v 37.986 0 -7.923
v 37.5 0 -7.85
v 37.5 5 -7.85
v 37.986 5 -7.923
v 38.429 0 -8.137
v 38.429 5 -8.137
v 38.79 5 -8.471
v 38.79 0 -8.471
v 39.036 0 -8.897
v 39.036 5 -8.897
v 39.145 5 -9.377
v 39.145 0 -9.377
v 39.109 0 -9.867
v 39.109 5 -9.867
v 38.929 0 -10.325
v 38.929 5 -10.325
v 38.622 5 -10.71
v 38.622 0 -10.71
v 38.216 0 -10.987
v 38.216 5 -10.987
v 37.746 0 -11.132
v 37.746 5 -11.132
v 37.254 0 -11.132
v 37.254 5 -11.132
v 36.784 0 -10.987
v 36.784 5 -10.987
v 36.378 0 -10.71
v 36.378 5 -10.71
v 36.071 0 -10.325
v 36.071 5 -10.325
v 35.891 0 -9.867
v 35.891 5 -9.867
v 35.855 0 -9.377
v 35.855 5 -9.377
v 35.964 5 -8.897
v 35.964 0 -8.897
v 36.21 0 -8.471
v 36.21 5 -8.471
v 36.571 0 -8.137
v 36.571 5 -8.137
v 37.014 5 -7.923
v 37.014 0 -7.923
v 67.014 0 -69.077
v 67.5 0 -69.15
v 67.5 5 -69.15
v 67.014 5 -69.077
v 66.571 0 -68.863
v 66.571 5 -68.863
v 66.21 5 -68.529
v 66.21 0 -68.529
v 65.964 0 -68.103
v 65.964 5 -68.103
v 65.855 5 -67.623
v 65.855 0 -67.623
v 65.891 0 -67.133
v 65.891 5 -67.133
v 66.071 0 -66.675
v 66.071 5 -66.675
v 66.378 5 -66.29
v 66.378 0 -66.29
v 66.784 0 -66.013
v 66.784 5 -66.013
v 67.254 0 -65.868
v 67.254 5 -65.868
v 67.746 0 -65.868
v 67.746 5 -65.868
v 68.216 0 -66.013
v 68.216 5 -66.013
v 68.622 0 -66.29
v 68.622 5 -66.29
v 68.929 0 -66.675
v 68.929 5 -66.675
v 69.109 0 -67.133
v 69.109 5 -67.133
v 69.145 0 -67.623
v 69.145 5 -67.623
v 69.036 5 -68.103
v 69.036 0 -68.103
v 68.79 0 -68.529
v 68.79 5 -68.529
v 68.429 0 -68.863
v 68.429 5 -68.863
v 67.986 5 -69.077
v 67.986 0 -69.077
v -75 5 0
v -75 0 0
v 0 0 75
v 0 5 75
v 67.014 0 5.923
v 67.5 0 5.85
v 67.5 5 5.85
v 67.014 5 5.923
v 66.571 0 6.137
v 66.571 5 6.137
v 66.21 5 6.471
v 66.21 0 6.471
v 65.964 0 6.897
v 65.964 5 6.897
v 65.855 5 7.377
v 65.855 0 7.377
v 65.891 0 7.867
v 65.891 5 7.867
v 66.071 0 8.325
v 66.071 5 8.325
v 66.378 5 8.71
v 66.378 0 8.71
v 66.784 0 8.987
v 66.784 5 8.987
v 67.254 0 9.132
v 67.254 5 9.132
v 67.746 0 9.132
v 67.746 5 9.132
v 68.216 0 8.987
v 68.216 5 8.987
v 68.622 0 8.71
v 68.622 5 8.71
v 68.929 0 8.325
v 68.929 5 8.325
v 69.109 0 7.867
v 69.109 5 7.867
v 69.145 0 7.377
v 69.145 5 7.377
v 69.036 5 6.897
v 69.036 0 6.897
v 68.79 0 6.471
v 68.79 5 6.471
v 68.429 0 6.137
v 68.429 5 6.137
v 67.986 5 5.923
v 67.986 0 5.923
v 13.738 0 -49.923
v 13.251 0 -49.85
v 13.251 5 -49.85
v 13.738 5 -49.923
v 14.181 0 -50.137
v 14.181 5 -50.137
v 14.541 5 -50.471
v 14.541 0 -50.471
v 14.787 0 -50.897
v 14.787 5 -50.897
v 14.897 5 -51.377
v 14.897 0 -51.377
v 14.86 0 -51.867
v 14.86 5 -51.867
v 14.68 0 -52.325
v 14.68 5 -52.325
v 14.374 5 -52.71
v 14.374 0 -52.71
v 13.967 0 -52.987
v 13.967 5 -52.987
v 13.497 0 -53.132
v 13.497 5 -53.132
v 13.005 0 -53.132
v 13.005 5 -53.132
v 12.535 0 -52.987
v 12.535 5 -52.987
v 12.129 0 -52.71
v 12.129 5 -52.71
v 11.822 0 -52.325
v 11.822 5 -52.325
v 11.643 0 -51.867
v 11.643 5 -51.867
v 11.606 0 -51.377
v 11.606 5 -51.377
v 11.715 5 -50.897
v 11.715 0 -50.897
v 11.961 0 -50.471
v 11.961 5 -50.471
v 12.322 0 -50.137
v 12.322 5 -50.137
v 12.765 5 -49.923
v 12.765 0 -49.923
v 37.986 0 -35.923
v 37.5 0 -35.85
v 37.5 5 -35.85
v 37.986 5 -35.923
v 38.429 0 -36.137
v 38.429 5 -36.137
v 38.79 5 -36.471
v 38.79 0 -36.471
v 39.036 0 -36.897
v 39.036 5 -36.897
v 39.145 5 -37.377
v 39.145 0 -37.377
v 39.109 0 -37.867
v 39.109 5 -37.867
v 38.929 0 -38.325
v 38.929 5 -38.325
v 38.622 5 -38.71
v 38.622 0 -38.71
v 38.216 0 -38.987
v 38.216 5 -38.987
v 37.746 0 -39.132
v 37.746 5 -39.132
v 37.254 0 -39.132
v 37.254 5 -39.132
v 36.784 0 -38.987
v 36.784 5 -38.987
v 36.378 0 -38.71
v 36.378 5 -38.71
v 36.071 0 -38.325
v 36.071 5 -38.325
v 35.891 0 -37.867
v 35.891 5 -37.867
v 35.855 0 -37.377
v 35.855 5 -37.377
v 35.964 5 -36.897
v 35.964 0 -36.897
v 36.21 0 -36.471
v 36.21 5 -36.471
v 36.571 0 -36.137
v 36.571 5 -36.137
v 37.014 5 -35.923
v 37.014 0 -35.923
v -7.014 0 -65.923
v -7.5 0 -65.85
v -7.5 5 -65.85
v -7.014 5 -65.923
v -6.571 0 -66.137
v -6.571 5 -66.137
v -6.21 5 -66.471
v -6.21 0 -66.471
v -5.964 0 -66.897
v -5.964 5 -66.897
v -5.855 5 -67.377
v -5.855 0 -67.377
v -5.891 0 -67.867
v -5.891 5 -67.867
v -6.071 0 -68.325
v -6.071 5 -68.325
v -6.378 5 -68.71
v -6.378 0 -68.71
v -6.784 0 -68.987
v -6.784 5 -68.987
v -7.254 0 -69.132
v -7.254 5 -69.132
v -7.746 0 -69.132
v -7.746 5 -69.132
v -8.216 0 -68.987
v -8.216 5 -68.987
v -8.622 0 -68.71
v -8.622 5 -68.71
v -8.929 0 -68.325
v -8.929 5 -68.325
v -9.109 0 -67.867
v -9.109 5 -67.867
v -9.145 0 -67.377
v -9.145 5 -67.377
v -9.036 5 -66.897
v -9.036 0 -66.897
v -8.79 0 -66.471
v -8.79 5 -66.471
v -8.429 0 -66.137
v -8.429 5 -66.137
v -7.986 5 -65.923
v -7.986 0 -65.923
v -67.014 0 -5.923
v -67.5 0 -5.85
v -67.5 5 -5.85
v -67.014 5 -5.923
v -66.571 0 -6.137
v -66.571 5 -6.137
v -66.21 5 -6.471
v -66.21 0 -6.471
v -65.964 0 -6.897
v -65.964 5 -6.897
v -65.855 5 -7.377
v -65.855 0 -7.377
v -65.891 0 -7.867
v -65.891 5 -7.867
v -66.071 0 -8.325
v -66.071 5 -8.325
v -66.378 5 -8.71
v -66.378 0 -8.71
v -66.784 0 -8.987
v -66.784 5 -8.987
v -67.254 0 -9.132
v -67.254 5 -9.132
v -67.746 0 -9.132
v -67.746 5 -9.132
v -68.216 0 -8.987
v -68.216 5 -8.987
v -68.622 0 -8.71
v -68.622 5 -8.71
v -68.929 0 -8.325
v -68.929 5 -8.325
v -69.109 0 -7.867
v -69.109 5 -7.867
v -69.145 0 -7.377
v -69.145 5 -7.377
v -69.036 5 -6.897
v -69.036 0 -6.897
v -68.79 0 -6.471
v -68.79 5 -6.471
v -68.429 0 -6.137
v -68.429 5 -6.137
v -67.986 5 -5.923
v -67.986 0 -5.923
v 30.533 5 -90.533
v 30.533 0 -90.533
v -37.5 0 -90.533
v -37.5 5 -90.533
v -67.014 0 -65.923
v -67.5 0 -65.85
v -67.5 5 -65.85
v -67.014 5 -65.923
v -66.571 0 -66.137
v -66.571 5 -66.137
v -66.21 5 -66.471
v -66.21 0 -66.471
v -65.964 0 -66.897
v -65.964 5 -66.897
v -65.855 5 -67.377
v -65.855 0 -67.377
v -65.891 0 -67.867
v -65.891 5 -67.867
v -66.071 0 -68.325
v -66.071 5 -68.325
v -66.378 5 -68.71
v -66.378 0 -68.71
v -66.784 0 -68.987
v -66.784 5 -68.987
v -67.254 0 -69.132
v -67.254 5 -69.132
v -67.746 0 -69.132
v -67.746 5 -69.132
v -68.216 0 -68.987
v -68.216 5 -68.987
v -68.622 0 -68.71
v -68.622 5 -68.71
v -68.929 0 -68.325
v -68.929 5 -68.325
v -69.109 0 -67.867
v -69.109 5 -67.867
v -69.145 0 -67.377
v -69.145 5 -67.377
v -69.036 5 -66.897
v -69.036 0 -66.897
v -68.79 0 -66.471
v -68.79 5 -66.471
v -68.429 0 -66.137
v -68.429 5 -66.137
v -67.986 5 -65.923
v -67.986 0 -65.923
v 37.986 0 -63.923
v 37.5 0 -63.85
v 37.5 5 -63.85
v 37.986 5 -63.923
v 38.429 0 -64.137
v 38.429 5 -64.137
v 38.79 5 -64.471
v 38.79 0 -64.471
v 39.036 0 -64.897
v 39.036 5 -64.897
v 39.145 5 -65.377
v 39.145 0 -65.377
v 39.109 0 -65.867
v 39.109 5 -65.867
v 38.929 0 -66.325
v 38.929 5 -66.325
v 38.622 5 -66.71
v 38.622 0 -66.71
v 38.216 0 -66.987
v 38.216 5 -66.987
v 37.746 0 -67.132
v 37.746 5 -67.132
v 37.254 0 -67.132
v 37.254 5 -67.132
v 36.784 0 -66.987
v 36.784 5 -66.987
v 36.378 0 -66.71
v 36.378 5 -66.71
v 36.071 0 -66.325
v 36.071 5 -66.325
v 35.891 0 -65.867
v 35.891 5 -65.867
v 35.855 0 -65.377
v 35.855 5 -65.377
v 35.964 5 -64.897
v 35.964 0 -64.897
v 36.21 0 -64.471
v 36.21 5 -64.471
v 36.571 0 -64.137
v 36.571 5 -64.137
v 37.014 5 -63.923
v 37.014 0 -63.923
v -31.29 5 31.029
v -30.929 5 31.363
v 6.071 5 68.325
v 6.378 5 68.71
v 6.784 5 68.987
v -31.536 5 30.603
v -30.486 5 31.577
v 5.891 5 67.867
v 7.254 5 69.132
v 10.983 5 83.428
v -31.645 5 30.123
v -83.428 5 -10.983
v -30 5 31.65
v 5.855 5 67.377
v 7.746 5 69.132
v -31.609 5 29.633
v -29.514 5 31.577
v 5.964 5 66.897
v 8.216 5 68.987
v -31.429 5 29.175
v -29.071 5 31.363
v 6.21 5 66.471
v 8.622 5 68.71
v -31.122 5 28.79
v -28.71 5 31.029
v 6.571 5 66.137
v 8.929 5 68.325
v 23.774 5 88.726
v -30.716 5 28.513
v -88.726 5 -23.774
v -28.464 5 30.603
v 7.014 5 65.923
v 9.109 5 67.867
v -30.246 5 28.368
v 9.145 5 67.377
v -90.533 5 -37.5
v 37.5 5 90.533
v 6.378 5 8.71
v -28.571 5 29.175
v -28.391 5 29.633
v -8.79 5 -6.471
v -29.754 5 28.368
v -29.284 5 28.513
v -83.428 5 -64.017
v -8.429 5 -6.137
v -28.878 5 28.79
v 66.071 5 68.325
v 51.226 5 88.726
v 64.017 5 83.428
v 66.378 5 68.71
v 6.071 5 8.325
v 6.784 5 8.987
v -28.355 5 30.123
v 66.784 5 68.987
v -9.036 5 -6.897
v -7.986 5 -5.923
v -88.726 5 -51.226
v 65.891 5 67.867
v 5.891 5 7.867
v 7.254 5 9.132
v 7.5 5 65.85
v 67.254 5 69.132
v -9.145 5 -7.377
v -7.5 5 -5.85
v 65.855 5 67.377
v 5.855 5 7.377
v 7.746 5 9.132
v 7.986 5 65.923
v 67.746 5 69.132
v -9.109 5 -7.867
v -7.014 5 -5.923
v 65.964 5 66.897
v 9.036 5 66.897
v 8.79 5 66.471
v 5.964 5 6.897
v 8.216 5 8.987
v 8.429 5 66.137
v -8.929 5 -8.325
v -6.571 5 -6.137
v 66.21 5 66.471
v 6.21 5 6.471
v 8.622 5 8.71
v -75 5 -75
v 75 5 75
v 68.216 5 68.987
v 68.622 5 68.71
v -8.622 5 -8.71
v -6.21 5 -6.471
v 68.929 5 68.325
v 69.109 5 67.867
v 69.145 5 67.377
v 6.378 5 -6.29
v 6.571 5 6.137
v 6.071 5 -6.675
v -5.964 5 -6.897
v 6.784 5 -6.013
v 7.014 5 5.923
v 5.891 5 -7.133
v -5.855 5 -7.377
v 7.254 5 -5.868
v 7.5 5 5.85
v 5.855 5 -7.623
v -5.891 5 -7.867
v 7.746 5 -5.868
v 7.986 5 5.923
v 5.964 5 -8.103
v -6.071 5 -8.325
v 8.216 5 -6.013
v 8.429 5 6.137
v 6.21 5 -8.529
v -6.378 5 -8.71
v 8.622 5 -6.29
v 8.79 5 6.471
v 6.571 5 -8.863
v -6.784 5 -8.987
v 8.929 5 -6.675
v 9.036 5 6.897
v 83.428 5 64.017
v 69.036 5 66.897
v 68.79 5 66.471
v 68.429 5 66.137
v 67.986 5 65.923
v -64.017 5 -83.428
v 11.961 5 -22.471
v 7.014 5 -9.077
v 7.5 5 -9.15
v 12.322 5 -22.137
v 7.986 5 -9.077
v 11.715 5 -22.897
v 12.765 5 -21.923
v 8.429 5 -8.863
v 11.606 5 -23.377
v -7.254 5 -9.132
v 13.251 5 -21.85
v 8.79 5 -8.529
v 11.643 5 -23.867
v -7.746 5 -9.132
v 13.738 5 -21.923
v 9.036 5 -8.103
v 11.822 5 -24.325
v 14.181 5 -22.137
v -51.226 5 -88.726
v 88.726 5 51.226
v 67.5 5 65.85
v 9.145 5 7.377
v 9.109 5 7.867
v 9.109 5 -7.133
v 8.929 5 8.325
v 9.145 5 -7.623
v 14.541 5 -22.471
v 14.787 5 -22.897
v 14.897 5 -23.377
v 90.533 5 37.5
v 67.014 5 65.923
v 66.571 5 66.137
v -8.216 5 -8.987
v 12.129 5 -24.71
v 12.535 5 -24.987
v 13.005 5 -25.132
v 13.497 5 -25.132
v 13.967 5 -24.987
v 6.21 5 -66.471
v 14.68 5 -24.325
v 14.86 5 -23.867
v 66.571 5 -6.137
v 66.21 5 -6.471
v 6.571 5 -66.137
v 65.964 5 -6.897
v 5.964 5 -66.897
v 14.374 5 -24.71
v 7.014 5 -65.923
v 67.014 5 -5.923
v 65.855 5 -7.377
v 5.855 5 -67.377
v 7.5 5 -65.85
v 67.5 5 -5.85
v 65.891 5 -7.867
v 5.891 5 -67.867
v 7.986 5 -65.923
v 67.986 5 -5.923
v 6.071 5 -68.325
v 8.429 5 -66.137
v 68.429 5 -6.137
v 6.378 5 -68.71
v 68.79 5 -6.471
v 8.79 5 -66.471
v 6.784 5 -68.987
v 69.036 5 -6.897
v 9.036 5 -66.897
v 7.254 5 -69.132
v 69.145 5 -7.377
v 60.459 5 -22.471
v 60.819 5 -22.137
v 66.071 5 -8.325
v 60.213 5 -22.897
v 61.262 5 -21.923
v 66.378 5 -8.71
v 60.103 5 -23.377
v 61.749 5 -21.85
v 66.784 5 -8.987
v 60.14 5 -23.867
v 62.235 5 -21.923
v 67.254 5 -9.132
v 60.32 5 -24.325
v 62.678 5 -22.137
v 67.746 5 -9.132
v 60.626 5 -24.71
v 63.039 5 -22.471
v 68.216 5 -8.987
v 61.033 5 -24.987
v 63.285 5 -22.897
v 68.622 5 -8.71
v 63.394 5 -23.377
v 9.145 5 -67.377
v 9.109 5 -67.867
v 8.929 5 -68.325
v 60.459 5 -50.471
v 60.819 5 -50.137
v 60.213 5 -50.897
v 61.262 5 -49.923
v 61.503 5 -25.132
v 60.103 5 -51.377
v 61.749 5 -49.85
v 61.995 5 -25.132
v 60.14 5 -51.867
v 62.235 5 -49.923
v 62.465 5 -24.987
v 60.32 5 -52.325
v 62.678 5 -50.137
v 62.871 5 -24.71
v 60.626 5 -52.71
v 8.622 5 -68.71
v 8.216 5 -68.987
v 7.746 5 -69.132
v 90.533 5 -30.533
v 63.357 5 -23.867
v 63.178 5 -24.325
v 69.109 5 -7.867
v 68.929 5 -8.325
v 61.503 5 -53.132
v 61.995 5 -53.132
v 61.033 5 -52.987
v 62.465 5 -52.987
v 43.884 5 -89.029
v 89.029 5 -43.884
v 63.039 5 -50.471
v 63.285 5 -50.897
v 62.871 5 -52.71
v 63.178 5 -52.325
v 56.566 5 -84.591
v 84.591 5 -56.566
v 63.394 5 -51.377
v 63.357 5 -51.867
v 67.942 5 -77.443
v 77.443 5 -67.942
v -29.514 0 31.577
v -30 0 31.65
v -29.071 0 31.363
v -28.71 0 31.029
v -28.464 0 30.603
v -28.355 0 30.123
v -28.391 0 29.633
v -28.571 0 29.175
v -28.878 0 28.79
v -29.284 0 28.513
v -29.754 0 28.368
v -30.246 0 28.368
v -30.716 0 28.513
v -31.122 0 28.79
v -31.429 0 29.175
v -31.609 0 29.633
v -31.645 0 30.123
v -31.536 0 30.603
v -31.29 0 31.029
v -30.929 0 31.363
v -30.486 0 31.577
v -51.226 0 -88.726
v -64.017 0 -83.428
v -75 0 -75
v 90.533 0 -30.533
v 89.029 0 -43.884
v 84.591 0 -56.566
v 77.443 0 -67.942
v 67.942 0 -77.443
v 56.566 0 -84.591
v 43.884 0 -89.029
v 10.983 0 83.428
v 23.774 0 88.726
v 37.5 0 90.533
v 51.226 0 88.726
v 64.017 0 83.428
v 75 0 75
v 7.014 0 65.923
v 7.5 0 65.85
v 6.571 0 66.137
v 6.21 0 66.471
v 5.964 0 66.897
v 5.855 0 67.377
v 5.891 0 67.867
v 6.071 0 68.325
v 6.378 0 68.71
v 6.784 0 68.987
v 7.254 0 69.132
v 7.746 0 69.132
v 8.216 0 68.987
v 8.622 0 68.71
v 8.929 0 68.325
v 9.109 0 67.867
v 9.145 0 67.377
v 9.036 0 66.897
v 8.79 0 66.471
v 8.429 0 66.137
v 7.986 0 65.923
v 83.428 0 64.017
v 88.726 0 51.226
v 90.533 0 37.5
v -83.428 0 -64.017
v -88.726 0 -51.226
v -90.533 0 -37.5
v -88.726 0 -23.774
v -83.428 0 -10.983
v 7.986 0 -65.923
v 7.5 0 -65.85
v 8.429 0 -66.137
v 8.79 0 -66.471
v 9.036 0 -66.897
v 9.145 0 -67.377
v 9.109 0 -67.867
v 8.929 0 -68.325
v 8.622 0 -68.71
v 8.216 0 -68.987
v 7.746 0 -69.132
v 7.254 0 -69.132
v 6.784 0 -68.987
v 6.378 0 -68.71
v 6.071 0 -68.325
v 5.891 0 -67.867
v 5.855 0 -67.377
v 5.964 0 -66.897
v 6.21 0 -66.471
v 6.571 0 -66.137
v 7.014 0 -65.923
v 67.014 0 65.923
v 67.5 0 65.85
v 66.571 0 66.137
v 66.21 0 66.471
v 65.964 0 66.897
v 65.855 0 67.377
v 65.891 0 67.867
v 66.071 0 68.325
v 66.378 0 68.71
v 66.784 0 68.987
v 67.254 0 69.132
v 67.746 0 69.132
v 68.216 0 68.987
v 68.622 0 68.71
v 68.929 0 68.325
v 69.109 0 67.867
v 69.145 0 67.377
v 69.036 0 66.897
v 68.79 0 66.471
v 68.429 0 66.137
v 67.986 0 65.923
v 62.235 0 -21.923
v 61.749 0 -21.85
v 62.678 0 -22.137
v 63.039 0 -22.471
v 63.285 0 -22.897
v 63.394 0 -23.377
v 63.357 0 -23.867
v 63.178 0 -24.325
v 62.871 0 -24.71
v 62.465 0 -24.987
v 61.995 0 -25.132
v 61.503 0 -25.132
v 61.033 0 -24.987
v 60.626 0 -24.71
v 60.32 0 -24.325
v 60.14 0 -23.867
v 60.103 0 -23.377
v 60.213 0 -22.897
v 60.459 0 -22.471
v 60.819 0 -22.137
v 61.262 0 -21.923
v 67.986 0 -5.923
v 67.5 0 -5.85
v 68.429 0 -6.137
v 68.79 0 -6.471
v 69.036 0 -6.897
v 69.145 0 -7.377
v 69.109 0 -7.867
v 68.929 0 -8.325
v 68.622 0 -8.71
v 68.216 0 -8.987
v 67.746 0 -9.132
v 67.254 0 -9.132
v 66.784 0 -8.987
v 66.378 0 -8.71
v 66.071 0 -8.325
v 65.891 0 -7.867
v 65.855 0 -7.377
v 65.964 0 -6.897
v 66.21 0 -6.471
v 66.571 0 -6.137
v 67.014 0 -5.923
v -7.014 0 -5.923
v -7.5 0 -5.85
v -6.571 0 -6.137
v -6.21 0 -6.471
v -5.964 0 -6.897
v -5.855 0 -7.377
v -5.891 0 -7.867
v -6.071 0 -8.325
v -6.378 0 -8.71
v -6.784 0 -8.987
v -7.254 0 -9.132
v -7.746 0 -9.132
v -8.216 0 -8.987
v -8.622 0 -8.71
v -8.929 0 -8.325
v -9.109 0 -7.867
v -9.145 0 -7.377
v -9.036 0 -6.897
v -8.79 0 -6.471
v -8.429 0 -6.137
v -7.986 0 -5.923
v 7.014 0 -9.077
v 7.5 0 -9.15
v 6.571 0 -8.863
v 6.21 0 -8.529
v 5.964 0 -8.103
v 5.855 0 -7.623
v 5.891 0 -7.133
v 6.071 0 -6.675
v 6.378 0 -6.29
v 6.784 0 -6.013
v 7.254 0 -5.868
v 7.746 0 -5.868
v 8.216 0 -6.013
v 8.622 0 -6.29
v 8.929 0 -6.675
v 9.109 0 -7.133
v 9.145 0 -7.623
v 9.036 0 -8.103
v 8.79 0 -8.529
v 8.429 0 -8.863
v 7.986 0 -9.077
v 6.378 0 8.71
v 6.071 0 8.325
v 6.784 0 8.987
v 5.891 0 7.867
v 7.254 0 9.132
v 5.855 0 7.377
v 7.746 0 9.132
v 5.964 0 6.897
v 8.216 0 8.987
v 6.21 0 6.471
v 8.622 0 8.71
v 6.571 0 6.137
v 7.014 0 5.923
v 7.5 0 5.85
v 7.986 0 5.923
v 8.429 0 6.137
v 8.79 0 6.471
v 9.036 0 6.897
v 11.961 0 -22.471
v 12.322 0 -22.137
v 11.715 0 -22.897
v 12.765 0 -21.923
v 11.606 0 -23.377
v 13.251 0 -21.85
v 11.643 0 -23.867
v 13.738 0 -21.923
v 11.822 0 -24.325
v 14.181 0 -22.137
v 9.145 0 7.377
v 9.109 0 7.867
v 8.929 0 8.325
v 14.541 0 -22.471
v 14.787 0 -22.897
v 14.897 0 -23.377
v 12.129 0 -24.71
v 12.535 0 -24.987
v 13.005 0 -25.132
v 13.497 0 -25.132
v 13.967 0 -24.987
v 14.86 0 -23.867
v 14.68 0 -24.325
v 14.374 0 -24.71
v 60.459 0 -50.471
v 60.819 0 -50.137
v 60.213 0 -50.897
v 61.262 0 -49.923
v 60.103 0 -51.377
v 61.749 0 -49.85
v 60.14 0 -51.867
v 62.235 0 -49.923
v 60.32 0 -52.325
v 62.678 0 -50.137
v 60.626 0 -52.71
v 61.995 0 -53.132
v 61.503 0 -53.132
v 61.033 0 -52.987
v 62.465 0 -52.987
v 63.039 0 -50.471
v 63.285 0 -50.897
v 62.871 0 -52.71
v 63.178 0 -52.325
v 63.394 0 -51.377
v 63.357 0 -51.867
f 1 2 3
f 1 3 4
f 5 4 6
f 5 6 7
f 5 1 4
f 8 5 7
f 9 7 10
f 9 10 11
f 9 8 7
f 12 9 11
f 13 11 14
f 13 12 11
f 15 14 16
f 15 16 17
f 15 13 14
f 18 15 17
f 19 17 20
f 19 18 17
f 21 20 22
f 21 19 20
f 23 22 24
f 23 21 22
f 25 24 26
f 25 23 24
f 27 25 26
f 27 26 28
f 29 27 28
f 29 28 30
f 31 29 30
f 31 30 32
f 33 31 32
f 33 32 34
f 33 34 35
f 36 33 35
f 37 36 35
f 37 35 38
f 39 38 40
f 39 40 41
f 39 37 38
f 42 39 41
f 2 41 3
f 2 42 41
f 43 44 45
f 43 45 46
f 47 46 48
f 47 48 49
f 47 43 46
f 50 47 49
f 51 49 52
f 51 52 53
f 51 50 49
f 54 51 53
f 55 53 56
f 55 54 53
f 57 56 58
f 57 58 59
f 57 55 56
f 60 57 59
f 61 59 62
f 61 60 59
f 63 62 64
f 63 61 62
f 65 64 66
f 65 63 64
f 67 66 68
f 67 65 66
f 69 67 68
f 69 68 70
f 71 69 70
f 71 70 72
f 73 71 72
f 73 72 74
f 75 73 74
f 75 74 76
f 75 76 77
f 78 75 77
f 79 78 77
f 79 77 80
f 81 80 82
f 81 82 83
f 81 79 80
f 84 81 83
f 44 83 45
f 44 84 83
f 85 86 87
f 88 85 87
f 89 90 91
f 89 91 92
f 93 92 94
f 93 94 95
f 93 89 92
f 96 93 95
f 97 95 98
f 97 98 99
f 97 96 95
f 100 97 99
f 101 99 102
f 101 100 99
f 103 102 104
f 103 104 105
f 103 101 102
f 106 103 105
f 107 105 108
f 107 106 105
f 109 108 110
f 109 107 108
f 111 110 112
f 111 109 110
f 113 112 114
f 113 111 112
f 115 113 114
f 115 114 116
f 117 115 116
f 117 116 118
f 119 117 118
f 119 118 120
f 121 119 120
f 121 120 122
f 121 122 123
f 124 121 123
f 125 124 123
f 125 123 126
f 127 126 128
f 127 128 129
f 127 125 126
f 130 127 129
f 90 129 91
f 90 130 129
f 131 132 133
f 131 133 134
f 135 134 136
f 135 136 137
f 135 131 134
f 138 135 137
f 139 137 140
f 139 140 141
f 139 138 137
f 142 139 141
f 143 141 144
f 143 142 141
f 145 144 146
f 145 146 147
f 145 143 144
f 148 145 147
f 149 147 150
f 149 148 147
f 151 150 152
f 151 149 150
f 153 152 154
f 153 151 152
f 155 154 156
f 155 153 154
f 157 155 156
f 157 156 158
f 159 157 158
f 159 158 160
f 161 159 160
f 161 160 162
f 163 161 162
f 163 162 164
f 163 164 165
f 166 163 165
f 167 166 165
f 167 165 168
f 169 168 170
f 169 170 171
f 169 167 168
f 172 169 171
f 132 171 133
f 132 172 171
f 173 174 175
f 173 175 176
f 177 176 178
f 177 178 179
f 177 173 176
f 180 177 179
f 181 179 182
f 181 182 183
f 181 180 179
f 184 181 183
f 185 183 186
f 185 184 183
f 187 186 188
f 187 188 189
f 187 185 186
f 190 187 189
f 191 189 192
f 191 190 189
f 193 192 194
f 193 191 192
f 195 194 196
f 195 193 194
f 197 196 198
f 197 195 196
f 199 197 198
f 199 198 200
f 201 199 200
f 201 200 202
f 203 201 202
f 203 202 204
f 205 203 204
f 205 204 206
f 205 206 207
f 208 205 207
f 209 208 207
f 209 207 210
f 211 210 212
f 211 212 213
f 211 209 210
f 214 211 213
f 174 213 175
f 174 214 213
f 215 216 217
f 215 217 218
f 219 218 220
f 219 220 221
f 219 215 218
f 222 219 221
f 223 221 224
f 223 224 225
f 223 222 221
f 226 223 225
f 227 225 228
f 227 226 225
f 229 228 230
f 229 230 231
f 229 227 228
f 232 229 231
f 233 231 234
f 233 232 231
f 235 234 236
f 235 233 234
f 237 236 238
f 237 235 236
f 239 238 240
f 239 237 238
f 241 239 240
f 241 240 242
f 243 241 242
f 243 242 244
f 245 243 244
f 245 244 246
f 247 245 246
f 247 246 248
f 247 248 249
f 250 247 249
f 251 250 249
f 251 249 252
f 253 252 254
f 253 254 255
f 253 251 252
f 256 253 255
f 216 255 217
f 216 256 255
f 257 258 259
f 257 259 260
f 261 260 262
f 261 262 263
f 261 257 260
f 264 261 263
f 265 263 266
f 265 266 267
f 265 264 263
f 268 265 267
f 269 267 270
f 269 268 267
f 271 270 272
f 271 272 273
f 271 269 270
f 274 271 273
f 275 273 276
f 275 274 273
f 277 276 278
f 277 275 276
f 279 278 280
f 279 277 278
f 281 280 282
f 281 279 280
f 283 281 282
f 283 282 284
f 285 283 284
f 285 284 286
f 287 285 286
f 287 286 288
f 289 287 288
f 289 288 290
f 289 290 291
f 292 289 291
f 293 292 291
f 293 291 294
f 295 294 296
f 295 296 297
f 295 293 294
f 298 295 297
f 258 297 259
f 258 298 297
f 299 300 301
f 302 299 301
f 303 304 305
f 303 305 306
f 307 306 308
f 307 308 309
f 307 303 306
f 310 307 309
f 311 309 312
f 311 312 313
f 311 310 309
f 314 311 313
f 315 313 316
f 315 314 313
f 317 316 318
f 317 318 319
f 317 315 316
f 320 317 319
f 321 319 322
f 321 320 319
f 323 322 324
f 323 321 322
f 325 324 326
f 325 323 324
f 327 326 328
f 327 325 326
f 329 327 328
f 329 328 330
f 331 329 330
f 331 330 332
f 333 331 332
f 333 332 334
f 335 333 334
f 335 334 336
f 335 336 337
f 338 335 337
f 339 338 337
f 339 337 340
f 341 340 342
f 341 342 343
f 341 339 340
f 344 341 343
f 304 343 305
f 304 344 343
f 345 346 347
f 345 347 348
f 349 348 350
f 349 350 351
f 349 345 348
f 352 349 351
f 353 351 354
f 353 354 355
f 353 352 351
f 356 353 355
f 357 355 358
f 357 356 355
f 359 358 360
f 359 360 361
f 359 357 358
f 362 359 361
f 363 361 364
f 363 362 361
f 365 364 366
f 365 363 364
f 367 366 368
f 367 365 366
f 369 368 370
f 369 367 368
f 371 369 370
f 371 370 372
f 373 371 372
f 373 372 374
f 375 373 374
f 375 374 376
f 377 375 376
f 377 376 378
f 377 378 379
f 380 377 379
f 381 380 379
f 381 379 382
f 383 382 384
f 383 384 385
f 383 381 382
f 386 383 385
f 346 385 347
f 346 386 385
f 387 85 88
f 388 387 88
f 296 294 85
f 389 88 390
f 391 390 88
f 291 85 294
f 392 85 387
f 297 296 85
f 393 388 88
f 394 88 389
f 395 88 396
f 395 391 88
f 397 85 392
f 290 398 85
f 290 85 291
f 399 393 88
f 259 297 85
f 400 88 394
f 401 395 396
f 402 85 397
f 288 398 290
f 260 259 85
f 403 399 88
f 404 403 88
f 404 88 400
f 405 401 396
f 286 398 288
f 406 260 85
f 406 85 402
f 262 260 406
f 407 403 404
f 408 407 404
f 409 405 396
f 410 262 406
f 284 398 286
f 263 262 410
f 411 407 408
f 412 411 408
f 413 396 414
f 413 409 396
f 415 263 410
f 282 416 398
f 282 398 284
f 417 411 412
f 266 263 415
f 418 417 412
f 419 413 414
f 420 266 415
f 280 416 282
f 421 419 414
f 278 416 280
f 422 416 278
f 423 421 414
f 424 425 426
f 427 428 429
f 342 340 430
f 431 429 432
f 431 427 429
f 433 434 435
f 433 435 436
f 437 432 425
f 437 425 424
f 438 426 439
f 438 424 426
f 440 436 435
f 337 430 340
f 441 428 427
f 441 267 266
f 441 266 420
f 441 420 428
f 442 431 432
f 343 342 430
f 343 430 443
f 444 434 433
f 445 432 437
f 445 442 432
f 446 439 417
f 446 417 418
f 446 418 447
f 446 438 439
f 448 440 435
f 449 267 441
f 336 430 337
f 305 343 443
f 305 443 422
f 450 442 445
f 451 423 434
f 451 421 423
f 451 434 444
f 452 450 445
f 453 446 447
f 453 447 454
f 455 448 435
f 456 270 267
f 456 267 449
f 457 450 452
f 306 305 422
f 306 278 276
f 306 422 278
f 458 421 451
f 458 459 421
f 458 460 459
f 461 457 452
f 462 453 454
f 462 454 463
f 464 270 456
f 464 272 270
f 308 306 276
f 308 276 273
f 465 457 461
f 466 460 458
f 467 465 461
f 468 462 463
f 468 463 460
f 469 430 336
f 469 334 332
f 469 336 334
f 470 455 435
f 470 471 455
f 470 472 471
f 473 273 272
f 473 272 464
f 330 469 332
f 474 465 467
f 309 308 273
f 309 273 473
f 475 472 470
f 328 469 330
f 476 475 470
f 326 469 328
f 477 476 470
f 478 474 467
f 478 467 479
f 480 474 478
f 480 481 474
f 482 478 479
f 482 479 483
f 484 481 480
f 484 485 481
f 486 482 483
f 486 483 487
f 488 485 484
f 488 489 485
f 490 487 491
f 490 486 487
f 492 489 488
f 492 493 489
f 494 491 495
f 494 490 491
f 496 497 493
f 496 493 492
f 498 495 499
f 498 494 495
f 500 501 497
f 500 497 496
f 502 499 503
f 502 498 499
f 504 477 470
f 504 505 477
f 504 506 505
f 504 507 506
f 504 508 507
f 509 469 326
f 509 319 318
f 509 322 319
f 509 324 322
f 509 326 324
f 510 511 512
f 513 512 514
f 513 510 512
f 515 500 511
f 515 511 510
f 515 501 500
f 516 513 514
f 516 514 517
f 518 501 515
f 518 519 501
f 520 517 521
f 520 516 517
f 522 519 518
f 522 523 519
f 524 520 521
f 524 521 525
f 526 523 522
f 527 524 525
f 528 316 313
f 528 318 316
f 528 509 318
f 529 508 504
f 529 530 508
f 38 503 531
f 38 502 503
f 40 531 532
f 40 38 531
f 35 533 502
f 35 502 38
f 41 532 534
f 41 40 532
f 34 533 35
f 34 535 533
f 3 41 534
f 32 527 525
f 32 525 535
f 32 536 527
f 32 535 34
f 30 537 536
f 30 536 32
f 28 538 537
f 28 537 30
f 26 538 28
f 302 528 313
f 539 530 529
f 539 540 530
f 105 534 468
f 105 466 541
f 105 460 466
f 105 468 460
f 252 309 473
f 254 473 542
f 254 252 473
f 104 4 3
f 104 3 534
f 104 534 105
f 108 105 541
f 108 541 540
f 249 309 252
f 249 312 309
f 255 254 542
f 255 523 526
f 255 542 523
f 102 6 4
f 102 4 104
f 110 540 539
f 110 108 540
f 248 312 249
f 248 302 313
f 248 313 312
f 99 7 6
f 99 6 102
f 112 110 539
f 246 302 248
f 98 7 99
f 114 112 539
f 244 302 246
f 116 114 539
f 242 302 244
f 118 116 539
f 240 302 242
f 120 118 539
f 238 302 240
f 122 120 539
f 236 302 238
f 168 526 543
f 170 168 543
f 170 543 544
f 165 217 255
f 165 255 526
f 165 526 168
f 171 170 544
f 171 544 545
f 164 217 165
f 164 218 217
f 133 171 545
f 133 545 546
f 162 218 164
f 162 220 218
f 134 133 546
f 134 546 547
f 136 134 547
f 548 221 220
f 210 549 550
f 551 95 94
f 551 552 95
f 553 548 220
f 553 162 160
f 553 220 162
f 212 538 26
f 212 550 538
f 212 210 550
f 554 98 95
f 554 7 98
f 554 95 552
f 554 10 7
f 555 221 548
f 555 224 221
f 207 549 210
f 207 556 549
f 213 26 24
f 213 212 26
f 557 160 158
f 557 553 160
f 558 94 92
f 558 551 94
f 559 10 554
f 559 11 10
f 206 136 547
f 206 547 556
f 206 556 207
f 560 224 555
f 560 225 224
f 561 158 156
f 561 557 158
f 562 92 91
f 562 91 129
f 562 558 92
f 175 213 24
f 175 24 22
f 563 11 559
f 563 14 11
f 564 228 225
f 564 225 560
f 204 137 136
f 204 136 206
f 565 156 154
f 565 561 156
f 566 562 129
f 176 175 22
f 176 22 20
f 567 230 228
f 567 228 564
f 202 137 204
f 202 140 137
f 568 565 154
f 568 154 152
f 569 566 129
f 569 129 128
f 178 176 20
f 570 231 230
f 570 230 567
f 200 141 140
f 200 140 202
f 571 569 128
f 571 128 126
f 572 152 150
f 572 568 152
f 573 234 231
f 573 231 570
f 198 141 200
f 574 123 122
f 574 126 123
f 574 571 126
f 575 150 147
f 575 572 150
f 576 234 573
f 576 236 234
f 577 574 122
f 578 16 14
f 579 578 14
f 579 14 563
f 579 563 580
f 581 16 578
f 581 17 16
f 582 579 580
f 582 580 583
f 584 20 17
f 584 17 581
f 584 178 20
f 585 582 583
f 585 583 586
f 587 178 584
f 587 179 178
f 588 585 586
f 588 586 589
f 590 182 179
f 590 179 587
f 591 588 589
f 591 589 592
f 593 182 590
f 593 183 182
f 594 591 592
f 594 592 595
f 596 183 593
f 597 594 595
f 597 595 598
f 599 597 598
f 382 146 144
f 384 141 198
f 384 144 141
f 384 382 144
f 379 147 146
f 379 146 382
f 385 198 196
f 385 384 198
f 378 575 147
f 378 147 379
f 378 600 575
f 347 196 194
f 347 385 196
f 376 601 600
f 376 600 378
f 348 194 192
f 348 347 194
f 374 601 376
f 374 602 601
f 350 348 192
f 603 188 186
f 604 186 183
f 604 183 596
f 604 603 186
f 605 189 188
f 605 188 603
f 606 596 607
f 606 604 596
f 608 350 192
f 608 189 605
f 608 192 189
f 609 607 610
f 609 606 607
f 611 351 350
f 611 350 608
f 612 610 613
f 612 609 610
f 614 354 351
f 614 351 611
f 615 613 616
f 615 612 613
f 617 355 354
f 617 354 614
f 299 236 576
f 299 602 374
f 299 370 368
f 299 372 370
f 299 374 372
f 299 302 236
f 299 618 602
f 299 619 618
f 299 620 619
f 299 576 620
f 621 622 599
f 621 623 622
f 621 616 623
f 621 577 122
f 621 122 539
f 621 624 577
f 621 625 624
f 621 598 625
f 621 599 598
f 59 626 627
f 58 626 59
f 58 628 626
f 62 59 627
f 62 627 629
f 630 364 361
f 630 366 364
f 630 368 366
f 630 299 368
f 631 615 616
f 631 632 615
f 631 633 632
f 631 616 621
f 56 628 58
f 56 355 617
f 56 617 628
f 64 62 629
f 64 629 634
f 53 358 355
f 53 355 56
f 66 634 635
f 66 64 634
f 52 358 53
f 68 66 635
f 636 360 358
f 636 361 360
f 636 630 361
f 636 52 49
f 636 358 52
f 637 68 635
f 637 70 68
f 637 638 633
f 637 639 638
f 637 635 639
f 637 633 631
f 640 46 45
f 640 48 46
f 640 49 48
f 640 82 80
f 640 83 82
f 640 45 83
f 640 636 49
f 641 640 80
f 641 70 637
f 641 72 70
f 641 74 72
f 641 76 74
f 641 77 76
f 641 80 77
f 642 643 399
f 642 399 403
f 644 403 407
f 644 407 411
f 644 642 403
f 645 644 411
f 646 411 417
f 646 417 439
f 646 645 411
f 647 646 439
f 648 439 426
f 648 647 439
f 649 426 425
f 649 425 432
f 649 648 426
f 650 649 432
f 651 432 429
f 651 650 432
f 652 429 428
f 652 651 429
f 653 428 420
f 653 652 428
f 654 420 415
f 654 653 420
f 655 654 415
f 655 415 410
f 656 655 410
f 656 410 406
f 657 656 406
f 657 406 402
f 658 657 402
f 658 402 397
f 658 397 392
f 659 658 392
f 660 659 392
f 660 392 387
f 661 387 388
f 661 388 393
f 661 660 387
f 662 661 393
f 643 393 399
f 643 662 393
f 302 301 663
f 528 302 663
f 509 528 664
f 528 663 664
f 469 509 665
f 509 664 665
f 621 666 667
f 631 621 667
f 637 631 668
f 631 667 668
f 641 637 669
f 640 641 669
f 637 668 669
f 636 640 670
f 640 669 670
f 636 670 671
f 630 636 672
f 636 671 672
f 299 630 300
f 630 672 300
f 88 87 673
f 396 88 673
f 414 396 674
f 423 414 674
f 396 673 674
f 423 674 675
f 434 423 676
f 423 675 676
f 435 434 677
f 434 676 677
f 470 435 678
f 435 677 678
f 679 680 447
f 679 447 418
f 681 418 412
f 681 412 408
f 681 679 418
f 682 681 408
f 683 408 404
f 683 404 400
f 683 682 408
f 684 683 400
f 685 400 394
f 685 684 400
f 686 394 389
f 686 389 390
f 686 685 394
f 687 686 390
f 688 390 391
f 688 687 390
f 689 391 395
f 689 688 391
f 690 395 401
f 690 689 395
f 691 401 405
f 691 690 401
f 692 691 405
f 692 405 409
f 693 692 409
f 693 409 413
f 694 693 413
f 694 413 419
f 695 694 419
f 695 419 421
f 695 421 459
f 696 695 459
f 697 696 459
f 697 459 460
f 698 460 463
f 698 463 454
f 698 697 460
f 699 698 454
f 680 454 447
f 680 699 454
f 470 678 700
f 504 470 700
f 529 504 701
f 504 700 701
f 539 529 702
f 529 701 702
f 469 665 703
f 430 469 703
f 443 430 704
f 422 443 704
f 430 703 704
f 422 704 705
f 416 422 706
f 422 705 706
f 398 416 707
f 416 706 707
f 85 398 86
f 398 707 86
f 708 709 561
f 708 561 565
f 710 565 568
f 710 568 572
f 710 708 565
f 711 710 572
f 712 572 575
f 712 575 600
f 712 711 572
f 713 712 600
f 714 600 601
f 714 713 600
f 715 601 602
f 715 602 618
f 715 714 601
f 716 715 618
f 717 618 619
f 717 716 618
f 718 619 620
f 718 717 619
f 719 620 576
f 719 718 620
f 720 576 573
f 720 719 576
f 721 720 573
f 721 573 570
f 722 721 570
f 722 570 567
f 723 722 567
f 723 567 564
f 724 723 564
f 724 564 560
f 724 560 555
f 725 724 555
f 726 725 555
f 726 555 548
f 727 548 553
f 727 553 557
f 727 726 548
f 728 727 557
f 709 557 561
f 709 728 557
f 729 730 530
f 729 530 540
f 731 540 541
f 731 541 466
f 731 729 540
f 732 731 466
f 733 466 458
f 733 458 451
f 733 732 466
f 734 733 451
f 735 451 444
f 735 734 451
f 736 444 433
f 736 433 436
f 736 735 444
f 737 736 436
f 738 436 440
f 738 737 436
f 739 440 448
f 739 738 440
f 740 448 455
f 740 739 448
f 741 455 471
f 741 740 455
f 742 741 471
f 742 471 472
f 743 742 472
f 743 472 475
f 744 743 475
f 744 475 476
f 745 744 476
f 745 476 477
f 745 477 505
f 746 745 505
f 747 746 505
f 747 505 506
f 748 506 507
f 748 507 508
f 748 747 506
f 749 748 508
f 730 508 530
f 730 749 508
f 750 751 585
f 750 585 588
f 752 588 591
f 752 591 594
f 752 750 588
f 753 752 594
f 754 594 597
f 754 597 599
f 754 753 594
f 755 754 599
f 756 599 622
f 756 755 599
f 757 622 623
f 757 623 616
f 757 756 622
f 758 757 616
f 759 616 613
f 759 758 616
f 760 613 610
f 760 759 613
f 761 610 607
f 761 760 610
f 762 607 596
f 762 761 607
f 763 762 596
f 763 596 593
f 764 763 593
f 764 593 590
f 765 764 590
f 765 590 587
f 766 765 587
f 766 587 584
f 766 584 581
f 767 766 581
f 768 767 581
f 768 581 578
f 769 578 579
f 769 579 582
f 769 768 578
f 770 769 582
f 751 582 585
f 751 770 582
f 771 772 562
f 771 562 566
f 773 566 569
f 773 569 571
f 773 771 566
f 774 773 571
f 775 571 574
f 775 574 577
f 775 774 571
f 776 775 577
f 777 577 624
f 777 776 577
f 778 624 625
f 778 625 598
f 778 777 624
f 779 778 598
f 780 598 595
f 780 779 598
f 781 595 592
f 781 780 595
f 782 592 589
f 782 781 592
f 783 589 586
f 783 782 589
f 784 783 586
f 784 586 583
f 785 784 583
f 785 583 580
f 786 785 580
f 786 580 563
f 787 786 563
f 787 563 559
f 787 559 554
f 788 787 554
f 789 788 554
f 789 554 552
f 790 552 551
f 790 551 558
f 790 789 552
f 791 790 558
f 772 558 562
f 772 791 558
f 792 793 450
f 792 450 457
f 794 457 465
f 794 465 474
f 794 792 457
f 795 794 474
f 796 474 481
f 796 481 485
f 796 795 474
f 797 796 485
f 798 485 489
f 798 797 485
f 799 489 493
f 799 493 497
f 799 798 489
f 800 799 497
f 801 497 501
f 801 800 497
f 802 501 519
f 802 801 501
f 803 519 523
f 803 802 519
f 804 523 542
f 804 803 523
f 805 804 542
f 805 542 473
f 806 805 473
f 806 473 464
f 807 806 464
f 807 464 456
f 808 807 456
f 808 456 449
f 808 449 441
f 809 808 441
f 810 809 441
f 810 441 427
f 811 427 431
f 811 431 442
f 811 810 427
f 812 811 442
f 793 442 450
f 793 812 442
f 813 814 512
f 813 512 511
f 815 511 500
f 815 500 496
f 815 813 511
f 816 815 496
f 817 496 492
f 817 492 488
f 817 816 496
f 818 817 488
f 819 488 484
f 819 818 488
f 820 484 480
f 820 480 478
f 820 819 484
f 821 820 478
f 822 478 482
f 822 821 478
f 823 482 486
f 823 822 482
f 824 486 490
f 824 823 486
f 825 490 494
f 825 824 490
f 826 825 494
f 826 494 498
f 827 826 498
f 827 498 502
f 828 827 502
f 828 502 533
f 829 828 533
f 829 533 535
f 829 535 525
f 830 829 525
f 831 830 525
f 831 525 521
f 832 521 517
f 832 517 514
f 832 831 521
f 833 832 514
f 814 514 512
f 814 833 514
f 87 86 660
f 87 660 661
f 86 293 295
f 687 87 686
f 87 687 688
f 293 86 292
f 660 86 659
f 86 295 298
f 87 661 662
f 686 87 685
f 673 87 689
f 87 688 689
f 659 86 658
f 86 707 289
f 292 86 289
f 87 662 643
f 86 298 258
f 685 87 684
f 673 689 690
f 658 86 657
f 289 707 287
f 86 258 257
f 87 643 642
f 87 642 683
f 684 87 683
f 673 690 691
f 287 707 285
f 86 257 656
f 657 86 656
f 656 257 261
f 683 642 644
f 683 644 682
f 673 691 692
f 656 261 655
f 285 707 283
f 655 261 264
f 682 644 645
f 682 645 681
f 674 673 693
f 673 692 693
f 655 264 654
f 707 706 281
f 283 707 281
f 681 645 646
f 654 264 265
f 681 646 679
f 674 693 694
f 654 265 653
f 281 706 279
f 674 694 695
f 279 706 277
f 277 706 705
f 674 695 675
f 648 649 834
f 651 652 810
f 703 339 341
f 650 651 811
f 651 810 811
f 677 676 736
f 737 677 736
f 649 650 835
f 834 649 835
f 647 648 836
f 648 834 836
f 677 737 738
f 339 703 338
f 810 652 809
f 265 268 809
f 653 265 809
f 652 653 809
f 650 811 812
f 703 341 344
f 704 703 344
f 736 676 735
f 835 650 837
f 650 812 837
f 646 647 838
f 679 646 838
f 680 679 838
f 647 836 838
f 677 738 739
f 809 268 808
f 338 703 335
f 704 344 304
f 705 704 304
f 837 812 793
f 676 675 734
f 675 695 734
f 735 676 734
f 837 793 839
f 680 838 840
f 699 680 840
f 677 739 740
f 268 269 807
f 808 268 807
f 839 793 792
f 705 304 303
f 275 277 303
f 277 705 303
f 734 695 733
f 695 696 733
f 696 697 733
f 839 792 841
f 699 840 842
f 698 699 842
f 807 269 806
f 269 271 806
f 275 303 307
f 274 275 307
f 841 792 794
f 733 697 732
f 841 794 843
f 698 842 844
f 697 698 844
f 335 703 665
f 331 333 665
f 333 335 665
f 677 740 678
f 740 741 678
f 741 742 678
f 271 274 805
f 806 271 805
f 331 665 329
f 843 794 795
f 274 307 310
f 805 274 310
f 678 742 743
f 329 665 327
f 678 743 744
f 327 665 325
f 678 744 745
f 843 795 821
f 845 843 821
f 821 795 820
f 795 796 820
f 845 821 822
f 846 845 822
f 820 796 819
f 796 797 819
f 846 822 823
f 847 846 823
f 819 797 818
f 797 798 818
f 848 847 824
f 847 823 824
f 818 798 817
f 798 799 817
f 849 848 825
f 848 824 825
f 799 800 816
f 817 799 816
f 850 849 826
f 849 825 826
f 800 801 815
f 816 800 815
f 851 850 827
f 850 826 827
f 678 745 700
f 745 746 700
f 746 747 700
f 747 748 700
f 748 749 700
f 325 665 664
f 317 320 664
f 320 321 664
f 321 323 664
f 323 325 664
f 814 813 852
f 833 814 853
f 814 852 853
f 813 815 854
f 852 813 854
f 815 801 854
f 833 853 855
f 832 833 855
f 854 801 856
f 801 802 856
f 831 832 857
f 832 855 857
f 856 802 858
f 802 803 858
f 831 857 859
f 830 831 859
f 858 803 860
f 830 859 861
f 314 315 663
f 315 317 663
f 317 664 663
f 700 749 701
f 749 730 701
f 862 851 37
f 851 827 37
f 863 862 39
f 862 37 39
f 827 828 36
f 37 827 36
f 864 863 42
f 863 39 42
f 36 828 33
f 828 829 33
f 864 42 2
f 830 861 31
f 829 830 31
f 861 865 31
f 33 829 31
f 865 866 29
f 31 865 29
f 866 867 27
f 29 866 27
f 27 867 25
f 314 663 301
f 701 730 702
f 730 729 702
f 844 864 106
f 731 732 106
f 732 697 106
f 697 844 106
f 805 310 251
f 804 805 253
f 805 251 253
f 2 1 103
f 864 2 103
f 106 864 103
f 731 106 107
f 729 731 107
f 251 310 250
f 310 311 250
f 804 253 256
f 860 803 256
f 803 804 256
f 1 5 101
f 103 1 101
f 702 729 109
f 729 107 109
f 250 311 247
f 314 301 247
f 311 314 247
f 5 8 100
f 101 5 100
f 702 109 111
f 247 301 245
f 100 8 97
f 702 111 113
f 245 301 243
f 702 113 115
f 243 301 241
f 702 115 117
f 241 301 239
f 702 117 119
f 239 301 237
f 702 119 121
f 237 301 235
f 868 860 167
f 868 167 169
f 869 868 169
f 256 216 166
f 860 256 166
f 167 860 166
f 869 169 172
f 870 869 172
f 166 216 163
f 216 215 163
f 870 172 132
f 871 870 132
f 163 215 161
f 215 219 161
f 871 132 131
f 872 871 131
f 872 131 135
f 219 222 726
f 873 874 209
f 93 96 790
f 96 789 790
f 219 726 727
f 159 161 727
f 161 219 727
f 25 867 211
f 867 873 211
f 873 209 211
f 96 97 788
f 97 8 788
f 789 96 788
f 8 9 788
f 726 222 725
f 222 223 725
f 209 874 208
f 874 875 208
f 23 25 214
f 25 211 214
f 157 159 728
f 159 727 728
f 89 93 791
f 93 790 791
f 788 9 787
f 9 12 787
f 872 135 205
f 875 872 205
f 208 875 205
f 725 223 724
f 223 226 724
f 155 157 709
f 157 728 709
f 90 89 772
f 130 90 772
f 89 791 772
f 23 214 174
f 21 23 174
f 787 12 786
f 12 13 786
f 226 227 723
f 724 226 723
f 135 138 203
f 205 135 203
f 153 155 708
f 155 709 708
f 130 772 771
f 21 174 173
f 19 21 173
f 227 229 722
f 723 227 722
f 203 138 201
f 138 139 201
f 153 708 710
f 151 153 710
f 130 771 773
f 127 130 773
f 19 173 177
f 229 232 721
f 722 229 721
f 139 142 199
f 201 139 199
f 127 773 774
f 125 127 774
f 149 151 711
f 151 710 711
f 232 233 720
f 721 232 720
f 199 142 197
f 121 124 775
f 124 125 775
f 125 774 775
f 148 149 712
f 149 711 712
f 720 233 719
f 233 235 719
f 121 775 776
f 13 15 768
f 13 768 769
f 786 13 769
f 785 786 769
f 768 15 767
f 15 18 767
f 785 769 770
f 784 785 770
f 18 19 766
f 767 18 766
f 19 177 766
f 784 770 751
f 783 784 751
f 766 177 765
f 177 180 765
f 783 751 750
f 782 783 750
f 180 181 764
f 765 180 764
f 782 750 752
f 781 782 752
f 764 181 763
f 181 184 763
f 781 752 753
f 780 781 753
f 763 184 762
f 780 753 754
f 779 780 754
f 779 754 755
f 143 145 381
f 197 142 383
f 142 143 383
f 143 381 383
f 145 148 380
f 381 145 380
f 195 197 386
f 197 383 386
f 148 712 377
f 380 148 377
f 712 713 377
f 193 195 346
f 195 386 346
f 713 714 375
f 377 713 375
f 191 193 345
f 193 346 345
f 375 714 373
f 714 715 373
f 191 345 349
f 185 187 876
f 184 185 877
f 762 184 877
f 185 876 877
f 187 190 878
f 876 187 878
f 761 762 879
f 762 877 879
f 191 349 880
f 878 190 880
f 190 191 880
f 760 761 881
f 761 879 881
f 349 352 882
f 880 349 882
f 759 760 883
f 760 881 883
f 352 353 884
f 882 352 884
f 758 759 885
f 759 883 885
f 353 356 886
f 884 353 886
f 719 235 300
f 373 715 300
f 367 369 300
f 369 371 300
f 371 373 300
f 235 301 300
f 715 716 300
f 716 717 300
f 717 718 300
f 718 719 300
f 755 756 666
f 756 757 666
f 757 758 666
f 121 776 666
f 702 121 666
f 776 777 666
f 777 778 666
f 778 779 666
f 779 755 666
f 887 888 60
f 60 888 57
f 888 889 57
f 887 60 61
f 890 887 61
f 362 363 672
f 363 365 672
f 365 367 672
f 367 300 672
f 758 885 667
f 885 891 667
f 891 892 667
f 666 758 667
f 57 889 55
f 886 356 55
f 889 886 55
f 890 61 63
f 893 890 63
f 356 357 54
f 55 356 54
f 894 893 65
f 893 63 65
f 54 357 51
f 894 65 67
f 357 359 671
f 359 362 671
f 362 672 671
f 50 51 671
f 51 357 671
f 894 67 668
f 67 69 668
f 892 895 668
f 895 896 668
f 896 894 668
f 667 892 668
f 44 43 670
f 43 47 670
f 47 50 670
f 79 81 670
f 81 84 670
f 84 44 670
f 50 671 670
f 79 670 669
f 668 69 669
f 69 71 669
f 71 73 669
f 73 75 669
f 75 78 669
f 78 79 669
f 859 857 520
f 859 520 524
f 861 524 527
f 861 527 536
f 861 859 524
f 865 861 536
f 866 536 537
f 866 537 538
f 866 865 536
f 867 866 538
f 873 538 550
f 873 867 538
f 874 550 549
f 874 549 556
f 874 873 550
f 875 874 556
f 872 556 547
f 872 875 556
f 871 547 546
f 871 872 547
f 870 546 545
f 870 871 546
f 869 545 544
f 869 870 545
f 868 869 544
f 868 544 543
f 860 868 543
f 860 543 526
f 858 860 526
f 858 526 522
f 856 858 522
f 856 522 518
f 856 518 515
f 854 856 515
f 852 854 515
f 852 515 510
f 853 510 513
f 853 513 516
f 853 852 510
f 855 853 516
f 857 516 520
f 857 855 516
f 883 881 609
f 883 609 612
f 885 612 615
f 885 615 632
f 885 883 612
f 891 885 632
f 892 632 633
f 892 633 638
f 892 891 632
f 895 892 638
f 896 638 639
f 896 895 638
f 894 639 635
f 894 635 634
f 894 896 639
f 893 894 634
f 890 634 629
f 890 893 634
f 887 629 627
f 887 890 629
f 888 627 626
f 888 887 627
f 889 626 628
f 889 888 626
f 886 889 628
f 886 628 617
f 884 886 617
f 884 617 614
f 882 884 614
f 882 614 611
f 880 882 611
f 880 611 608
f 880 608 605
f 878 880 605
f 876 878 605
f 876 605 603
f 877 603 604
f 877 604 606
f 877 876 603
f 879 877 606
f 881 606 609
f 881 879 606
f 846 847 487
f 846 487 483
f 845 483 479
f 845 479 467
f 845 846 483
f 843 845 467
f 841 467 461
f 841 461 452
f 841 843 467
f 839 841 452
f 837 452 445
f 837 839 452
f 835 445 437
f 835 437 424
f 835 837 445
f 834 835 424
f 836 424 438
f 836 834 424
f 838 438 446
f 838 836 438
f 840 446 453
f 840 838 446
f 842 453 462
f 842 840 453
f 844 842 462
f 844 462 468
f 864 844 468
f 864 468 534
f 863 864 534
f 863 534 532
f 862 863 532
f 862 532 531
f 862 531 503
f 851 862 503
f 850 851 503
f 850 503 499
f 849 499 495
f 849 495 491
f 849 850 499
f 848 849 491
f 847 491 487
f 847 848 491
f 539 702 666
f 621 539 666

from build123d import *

# Parameters (mm, degrees)
SKETCH_1_R      = 1.65
EXTRUDE_1_DEPTH = 5


with BuildPart() as part:
    # 草图1 → 凸台-拉伸1 (new body)
    with BuildSketch(Plane(origin=(0, 0, 0), x_dir=(1, 0, 0), z_dir=(0, 1, 0))):
        with BuildLine():
            Line((-75, 0), (0, -75))
            ThreePointArc((0, -75), (37.5, -90.533008589), (75, -75))
            ThreePointArc((75, -75), (86.496111183, -57.794853755), (90.533008589, -37.5))
            Line((90.533008589, -37.5), (90.533008589, 30.533008589))
            ThreePointArc((90.533008589, 30.533008589), (72.95941546, 72.95941546), (30.533008589, 90.533008589))
            Line((30.533008589, 90.533008589), (-37.5, 90.533008589))
            ThreePointArc((-37.5, 90.533008589), (-57.794853755, 86.496111183), (-75, 75))
            ThreePointArc((-75, 75), (-90.533008589, 37.5), (-75, 0))
        make_face()
        with Locations(Location((37.5, 65.5, 0), (0, 0, 270))):
            Circle(SKETCH_1_R, mode=Mode.SUBTRACT)
        with Locations(Location((61.748711306, 51.5, 0), (0, 0, 270))):
            Circle(SKETCH_1_R, mode=Mode.SUBTRACT)
        with Locations(Location((61.748711306, 23.5, 0), (0, 0, 270))):
            Circle(SKETCH_1_R, mode=Mode.SUBTRACT)
        with Locations(Location((37.5, 9.5, 0), (0, 0, 270))):
            Circle(SKETCH_1_R, mode=Mode.SUBTRACT)
        with Locations(Location((13.251288694, 23.5, 0), (0, 0, 270))):
            Circle(SKETCH_1_R, mode=Mode.SUBTRACT)
        with Locations(Location((13.251288694, 51.5, 0), (0, 0, 270))):
            Circle(SKETCH_1_R, mode=Mode.SUBTRACT)
        with Locations(Location((7.5, 67.5, 0), (0, 0, 270))):
            Circle(SKETCH_1_R, mode=Mode.SUBTRACT)
        with Locations(Location((67.5, 67.5, 0), (0, 0, 90))):
            Circle(SKETCH_1_R, mode=Mode.SUBTRACT)
        with Locations(Location((67.5, 7.5, 0), (0, 0, 270))):
            Circle(SKETCH_1_R, mode=Mode.SUBTRACT)
        with Locations(Location((7.5, 7.5, 0), (0, 0, 90))):
            Circle(SKETCH_1_R, mode=Mode.SUBTRACT)
        with Locations(Location((37.5, 37.5, 0), (0, 0, 270))):
            Circle(SKETCH_1_R, mode=Mode.SUBTRACT)
        with Locations(Location((-67.5, 67.5, 0), (0, 0, 270))):
            Circle(SKETCH_1_R, mode=Mode.SUBTRACT)
        with Locations(Location((-7.5, 67.5, 0), (0, 0, 270))):
            Circle(SKETCH_1_R, mode=Mode.SUBTRACT)
        with Locations(Location((-67.5, 7.5, 0), (0, 0, 270))):
            Circle(SKETCH_1_R, mode=Mode.SUBTRACT)
        with Locations(Location((-7.5, 7.5, 0), (0, 0, 270))):
            Circle(SKETCH_1_R, mode=Mode.SUBTRACT)
        with Locations(Location((7.5, -67.5, 0), (0, 0, 90))):
            Circle(SKETCH_1_R, mode=Mode.SUBTRACT)
        with Locations(Location((7.5, -7.5, 0), (0, 0, 90))):
            Circle(SKETCH_1_R, mode=Mode.SUBTRACT)
        with Locations(Location((67.5, -7.5, 0), (0, 0, 90))):
            Circle(SKETCH_1_R, mode=Mode.SUBTRACT)
        with Locations(Location((67.5, -67.5, 0), (0, 0, 90))):
            Circle(SKETCH_1_R, mode=Mode.SUBTRACT)
        with Locations(Location((-30, -30, 0), (0, 0, 270))):
            Circle(SKETCH_1_R, mode=Mode.SUBTRACT)
    extrude(amount=EXTRUDE_1_DEPTH)


solid = part.part
